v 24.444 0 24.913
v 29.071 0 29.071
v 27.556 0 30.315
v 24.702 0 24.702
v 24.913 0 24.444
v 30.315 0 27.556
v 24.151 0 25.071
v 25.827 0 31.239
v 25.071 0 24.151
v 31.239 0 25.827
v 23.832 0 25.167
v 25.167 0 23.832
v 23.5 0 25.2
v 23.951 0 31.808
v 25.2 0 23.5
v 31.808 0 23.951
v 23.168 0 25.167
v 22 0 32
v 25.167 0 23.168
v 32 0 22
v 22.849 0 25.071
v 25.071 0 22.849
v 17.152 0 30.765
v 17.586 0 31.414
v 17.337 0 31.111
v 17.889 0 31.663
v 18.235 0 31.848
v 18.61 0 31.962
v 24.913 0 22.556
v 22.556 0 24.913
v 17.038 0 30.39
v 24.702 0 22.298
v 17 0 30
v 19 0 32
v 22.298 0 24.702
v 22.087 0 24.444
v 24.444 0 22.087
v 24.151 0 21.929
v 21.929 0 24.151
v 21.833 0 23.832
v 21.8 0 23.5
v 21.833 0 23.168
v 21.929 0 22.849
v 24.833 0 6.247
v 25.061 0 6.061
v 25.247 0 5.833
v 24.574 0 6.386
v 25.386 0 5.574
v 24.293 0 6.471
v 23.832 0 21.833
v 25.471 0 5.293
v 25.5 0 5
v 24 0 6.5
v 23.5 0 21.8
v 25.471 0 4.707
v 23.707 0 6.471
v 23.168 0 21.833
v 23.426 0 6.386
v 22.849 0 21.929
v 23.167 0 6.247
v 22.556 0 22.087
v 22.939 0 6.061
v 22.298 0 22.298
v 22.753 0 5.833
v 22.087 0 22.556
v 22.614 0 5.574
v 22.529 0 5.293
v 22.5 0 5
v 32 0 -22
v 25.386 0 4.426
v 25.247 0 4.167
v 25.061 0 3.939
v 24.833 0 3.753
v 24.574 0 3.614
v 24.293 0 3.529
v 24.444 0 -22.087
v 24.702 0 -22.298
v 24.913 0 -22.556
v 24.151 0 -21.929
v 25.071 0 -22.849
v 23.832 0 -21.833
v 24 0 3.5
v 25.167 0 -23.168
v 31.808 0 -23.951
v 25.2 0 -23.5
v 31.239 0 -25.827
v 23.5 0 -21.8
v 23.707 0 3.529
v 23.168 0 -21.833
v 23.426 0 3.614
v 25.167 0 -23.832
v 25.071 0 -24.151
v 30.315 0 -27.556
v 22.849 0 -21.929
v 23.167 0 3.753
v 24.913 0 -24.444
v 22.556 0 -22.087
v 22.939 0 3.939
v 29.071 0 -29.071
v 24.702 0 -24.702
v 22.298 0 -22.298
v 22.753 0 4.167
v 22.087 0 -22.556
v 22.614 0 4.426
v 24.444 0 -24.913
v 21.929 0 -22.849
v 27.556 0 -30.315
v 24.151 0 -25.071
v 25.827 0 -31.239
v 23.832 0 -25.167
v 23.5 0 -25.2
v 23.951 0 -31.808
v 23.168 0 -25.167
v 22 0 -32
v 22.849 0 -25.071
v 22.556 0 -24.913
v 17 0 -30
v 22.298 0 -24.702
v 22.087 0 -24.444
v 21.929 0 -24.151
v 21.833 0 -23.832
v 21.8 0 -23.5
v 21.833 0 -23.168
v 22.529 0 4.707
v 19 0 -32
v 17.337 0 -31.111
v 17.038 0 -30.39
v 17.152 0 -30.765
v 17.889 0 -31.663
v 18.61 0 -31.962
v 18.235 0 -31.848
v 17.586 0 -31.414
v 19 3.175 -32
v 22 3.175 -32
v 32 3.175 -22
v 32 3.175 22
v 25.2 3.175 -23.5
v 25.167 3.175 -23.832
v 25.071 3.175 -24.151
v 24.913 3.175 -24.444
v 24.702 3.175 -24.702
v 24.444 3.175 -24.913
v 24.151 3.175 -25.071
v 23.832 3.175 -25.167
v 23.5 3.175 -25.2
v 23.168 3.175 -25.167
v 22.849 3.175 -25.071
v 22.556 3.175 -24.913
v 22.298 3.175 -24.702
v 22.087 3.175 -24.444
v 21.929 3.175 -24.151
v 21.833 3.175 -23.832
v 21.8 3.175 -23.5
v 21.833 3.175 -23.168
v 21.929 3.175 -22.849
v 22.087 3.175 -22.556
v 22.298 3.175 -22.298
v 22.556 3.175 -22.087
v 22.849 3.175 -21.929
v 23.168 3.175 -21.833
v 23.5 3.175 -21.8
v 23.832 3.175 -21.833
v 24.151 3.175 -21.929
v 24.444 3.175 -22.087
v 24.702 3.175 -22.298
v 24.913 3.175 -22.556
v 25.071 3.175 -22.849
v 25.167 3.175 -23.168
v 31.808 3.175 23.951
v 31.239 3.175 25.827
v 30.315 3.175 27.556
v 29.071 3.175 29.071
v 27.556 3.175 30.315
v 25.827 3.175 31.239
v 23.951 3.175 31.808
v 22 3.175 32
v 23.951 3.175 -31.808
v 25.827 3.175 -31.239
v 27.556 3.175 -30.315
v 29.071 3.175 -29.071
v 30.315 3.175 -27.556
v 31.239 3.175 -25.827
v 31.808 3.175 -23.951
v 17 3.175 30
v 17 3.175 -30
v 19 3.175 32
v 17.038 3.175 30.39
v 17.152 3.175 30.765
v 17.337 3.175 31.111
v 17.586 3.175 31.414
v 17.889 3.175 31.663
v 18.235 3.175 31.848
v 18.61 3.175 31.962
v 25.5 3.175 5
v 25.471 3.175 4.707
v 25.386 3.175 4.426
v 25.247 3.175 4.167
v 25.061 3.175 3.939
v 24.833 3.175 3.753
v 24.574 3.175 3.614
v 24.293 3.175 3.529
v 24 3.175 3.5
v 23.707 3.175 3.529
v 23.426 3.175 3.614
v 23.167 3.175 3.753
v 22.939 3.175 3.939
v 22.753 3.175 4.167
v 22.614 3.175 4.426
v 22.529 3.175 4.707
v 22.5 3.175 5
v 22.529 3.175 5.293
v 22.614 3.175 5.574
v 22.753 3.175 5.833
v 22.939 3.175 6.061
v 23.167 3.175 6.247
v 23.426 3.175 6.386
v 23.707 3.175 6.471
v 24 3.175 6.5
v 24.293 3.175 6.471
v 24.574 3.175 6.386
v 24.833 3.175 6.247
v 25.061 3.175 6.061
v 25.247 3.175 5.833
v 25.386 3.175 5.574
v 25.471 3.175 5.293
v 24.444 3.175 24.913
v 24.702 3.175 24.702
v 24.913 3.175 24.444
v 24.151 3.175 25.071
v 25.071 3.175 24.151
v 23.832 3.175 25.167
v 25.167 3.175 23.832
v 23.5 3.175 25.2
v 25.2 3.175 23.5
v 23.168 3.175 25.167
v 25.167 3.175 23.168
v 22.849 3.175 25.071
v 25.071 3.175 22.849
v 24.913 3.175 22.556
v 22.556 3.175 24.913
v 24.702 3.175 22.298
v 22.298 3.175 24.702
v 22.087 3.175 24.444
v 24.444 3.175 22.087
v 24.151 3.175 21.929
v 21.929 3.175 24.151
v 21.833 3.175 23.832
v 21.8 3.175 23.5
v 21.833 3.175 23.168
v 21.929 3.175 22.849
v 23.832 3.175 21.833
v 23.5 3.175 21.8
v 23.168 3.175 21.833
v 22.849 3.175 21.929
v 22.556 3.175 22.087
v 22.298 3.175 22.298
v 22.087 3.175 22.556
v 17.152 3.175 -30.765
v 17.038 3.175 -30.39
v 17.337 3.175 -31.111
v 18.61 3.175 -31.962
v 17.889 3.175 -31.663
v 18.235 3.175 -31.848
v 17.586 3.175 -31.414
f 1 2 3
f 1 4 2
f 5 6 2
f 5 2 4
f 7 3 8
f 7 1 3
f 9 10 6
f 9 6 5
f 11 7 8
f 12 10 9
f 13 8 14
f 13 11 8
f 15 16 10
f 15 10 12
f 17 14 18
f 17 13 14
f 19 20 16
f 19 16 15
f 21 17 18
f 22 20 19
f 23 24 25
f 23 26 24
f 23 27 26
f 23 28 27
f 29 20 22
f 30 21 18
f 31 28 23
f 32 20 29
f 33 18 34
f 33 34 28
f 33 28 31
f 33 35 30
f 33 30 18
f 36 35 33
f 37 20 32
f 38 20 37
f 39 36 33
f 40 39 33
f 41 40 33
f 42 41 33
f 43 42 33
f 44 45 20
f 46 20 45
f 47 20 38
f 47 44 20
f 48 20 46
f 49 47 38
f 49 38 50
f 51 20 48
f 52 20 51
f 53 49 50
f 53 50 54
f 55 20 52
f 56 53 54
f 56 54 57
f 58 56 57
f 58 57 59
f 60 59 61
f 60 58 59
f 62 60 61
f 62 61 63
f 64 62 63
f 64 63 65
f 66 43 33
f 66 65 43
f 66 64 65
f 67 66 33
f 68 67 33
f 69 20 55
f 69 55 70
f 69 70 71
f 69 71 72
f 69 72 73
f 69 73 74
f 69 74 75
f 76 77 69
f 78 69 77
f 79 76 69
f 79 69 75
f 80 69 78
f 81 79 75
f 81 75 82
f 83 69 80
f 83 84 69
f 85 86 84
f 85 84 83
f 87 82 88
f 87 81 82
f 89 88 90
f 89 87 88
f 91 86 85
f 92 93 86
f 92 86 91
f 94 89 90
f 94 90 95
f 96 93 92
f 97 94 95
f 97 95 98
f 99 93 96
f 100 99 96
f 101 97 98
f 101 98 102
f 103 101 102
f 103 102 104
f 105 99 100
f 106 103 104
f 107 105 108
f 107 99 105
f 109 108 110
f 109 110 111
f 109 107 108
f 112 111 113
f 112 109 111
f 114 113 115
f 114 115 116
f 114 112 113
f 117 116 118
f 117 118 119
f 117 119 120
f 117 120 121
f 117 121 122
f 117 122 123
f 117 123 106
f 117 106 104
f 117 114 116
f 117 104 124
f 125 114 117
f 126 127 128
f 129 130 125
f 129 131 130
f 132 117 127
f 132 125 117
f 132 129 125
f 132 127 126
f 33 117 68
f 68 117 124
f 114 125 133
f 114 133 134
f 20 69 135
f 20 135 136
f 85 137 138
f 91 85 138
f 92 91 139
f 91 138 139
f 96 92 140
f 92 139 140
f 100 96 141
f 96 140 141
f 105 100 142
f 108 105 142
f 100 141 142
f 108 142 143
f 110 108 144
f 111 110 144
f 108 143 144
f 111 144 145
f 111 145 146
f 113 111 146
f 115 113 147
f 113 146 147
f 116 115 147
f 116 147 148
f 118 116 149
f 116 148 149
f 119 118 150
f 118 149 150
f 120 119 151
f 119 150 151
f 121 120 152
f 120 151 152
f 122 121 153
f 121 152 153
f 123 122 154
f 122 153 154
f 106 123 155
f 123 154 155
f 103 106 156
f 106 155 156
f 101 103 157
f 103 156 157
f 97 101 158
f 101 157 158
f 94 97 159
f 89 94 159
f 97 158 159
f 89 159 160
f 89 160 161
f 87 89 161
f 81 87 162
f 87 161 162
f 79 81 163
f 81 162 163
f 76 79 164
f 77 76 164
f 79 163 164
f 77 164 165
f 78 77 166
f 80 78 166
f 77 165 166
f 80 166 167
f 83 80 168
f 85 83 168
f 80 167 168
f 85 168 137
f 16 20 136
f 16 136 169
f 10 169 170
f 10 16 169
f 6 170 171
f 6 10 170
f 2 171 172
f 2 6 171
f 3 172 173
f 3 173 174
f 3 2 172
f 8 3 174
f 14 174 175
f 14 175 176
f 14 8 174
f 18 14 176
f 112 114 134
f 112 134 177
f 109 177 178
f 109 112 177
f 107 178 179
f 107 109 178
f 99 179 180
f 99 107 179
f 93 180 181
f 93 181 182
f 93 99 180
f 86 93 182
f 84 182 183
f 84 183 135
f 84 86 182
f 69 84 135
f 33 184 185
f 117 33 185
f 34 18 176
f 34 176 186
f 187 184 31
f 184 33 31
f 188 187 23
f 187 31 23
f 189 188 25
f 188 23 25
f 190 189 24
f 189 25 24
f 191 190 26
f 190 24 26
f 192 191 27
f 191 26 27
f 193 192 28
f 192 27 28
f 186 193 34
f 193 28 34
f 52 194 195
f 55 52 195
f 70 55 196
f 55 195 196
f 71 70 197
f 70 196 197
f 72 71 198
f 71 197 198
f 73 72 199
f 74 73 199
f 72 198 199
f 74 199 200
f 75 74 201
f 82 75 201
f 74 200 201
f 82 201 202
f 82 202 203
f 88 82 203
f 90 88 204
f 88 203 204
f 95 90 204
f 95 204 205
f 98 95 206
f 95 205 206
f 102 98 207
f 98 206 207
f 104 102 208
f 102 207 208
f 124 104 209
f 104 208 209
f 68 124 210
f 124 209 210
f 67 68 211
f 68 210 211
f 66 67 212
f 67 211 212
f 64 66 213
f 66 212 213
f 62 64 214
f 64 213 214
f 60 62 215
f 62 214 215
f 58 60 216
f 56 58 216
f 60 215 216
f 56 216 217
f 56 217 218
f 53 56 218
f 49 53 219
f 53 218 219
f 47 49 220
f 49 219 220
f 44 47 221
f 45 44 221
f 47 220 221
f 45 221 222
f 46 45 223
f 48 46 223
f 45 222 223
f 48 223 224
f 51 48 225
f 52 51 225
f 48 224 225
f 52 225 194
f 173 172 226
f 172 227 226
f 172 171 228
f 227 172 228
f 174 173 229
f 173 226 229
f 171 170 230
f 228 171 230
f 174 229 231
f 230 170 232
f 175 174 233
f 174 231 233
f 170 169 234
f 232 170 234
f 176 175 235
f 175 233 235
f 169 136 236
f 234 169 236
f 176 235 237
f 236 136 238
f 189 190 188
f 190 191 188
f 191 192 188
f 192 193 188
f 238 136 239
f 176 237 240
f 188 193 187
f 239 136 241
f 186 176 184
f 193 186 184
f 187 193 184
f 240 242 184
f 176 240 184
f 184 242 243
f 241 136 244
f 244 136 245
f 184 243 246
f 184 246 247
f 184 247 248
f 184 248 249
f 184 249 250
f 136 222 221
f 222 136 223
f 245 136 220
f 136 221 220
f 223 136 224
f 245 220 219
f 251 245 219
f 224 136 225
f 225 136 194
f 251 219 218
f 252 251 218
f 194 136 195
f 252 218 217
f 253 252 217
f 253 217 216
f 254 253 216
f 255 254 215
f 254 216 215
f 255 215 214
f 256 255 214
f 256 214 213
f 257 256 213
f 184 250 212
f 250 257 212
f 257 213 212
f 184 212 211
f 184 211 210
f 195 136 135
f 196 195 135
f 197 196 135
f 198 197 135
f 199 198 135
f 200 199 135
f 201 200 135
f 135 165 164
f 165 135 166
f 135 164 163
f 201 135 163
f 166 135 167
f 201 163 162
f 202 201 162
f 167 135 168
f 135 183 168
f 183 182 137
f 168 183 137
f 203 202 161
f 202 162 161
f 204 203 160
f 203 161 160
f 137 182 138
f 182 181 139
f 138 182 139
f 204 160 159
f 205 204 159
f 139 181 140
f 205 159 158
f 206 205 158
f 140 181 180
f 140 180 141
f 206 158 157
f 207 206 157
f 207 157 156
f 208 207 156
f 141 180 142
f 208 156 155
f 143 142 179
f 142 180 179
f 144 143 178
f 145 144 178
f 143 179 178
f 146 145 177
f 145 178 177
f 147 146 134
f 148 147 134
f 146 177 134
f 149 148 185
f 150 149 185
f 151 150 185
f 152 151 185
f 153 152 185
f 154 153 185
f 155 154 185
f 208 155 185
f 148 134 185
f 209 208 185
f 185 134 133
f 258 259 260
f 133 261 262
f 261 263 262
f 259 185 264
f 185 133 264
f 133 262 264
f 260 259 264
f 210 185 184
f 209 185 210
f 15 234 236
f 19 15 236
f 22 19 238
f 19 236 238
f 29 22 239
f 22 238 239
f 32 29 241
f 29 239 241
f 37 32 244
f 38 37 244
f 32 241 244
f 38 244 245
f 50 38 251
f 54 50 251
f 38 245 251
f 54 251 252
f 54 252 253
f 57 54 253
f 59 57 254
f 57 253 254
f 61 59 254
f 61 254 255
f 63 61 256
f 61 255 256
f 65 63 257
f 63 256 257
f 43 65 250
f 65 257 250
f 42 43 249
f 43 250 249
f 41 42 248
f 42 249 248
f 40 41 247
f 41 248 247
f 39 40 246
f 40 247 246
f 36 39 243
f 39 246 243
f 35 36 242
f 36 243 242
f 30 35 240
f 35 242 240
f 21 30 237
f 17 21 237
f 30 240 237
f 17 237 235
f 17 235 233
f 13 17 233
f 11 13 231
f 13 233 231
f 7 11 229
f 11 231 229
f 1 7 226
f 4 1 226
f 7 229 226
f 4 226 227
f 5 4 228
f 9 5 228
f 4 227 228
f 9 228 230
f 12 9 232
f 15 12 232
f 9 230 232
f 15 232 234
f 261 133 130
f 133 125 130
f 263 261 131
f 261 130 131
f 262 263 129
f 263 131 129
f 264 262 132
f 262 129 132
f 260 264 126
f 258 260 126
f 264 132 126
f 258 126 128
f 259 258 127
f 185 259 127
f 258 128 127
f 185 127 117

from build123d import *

# Parameters (mm, degrees)
BOSS_EXTRUDE2_DEPTH = 3.175
SKETCH3_R           = 1.7
CUT_EXTRUDE2_DEPTH  = 3.175
SKETCH4_R           = 1.5
CUT_EXTRUDE3_DEPTH  = 3.175
SKETCH5_W           = 61.765088801
SKETCH5_H           = 64
CUT_EXTRUDE4_DEPTH  = 3.175
FILLET1_R           = 2


with BuildPart() as part:
    # Sketch1 → Boss-Extrude2 (new body)
    with BuildSketch(Plane(origin=(0, 0, 0), x_dir=(1, 0, 0), z_dir=(0, 1, 0))):
        with BuildLine():
            Line((-22, 32), (22, 32))
            ThreePointArc((22, 32), (29.071067812, 29.071067812), (32, 22))
            Line((32, 22), (32, -22))
            ThreePointArc((32, -22), (29.071067812, -29.071067812), (22, -32))
            Line((22, -32), (-22, -32))
            ThreePointArc((-22, -32), (-29.071067812, -29.071067812), (-32, -22))
            Line((-32, -22), (-32, 22))
            ThreePointArc((-32, 22), (-29.071067812, 29.071067812), (-22, 32))
        make_face()
    extrude(amount=BOSS_EXTRUDE2_DEPTH)

    # Sketch3 → Cut-Extrude2 (cut)
    with BuildSketch(Plane(origin=(0, 3.175, 0), x_dir=(1, 0, 0), z_dir=(0, 1, 0))):
        with Locations((-23.5, 23.5)):
            Circle(SKETCH3_R)
        with Locations((23.5, 23.5)):
            Circle(SKETCH3_R)
        with Locations((23.5, -23.5)):
            Circle(SKETCH3_R)
        with Locations((-23.5, -23.5)):
            Circle(SKETCH3_R)
    extrude(amount=-CUT_EXTRUDE2_DEPTH, mode=Mode.SUBTRACT)

    # Sketch4 → Cut-Extrude3 (cut)
    with BuildSketch(Plane(origin=(0, 3.175, 0), x_dir=(1, 0, 0), z_dir=(0, 1, 0))):
        with Locations((24, -5)):
            Circle(SKETCH4_R)
        with Locations((-24, -5)):
            Circle(SKETCH4_R)
    extrude(amount=-CUT_EXTRUDE3_DEPTH, mode=Mode.SUBTRACT)

    # Sketch5 → Cut-Extrude4 (cut)
    with BuildSketch(Plane(origin=(0, 3.175, 0), x_dir=(1, 0, 0), z_dir=(0, 1, 0))):
        with Locations((-13.882544401, 0)):
            Rectangle(SKETCH5_W, SKETCH5_H)
    extrude(amount=-CUT_EXTRUDE4_DEPTH, mode=Mode.SUBTRACT)

    # Fillet1
    fillet1_edges = [part.edges().sort_by_distance(p)[0] for p in [
        (17, 1.5875, 32),
        (17, 1.5875, -32),
    ]]
    fillet(fillet1_edges, radius=FILLET1_R)


solid = part.part
